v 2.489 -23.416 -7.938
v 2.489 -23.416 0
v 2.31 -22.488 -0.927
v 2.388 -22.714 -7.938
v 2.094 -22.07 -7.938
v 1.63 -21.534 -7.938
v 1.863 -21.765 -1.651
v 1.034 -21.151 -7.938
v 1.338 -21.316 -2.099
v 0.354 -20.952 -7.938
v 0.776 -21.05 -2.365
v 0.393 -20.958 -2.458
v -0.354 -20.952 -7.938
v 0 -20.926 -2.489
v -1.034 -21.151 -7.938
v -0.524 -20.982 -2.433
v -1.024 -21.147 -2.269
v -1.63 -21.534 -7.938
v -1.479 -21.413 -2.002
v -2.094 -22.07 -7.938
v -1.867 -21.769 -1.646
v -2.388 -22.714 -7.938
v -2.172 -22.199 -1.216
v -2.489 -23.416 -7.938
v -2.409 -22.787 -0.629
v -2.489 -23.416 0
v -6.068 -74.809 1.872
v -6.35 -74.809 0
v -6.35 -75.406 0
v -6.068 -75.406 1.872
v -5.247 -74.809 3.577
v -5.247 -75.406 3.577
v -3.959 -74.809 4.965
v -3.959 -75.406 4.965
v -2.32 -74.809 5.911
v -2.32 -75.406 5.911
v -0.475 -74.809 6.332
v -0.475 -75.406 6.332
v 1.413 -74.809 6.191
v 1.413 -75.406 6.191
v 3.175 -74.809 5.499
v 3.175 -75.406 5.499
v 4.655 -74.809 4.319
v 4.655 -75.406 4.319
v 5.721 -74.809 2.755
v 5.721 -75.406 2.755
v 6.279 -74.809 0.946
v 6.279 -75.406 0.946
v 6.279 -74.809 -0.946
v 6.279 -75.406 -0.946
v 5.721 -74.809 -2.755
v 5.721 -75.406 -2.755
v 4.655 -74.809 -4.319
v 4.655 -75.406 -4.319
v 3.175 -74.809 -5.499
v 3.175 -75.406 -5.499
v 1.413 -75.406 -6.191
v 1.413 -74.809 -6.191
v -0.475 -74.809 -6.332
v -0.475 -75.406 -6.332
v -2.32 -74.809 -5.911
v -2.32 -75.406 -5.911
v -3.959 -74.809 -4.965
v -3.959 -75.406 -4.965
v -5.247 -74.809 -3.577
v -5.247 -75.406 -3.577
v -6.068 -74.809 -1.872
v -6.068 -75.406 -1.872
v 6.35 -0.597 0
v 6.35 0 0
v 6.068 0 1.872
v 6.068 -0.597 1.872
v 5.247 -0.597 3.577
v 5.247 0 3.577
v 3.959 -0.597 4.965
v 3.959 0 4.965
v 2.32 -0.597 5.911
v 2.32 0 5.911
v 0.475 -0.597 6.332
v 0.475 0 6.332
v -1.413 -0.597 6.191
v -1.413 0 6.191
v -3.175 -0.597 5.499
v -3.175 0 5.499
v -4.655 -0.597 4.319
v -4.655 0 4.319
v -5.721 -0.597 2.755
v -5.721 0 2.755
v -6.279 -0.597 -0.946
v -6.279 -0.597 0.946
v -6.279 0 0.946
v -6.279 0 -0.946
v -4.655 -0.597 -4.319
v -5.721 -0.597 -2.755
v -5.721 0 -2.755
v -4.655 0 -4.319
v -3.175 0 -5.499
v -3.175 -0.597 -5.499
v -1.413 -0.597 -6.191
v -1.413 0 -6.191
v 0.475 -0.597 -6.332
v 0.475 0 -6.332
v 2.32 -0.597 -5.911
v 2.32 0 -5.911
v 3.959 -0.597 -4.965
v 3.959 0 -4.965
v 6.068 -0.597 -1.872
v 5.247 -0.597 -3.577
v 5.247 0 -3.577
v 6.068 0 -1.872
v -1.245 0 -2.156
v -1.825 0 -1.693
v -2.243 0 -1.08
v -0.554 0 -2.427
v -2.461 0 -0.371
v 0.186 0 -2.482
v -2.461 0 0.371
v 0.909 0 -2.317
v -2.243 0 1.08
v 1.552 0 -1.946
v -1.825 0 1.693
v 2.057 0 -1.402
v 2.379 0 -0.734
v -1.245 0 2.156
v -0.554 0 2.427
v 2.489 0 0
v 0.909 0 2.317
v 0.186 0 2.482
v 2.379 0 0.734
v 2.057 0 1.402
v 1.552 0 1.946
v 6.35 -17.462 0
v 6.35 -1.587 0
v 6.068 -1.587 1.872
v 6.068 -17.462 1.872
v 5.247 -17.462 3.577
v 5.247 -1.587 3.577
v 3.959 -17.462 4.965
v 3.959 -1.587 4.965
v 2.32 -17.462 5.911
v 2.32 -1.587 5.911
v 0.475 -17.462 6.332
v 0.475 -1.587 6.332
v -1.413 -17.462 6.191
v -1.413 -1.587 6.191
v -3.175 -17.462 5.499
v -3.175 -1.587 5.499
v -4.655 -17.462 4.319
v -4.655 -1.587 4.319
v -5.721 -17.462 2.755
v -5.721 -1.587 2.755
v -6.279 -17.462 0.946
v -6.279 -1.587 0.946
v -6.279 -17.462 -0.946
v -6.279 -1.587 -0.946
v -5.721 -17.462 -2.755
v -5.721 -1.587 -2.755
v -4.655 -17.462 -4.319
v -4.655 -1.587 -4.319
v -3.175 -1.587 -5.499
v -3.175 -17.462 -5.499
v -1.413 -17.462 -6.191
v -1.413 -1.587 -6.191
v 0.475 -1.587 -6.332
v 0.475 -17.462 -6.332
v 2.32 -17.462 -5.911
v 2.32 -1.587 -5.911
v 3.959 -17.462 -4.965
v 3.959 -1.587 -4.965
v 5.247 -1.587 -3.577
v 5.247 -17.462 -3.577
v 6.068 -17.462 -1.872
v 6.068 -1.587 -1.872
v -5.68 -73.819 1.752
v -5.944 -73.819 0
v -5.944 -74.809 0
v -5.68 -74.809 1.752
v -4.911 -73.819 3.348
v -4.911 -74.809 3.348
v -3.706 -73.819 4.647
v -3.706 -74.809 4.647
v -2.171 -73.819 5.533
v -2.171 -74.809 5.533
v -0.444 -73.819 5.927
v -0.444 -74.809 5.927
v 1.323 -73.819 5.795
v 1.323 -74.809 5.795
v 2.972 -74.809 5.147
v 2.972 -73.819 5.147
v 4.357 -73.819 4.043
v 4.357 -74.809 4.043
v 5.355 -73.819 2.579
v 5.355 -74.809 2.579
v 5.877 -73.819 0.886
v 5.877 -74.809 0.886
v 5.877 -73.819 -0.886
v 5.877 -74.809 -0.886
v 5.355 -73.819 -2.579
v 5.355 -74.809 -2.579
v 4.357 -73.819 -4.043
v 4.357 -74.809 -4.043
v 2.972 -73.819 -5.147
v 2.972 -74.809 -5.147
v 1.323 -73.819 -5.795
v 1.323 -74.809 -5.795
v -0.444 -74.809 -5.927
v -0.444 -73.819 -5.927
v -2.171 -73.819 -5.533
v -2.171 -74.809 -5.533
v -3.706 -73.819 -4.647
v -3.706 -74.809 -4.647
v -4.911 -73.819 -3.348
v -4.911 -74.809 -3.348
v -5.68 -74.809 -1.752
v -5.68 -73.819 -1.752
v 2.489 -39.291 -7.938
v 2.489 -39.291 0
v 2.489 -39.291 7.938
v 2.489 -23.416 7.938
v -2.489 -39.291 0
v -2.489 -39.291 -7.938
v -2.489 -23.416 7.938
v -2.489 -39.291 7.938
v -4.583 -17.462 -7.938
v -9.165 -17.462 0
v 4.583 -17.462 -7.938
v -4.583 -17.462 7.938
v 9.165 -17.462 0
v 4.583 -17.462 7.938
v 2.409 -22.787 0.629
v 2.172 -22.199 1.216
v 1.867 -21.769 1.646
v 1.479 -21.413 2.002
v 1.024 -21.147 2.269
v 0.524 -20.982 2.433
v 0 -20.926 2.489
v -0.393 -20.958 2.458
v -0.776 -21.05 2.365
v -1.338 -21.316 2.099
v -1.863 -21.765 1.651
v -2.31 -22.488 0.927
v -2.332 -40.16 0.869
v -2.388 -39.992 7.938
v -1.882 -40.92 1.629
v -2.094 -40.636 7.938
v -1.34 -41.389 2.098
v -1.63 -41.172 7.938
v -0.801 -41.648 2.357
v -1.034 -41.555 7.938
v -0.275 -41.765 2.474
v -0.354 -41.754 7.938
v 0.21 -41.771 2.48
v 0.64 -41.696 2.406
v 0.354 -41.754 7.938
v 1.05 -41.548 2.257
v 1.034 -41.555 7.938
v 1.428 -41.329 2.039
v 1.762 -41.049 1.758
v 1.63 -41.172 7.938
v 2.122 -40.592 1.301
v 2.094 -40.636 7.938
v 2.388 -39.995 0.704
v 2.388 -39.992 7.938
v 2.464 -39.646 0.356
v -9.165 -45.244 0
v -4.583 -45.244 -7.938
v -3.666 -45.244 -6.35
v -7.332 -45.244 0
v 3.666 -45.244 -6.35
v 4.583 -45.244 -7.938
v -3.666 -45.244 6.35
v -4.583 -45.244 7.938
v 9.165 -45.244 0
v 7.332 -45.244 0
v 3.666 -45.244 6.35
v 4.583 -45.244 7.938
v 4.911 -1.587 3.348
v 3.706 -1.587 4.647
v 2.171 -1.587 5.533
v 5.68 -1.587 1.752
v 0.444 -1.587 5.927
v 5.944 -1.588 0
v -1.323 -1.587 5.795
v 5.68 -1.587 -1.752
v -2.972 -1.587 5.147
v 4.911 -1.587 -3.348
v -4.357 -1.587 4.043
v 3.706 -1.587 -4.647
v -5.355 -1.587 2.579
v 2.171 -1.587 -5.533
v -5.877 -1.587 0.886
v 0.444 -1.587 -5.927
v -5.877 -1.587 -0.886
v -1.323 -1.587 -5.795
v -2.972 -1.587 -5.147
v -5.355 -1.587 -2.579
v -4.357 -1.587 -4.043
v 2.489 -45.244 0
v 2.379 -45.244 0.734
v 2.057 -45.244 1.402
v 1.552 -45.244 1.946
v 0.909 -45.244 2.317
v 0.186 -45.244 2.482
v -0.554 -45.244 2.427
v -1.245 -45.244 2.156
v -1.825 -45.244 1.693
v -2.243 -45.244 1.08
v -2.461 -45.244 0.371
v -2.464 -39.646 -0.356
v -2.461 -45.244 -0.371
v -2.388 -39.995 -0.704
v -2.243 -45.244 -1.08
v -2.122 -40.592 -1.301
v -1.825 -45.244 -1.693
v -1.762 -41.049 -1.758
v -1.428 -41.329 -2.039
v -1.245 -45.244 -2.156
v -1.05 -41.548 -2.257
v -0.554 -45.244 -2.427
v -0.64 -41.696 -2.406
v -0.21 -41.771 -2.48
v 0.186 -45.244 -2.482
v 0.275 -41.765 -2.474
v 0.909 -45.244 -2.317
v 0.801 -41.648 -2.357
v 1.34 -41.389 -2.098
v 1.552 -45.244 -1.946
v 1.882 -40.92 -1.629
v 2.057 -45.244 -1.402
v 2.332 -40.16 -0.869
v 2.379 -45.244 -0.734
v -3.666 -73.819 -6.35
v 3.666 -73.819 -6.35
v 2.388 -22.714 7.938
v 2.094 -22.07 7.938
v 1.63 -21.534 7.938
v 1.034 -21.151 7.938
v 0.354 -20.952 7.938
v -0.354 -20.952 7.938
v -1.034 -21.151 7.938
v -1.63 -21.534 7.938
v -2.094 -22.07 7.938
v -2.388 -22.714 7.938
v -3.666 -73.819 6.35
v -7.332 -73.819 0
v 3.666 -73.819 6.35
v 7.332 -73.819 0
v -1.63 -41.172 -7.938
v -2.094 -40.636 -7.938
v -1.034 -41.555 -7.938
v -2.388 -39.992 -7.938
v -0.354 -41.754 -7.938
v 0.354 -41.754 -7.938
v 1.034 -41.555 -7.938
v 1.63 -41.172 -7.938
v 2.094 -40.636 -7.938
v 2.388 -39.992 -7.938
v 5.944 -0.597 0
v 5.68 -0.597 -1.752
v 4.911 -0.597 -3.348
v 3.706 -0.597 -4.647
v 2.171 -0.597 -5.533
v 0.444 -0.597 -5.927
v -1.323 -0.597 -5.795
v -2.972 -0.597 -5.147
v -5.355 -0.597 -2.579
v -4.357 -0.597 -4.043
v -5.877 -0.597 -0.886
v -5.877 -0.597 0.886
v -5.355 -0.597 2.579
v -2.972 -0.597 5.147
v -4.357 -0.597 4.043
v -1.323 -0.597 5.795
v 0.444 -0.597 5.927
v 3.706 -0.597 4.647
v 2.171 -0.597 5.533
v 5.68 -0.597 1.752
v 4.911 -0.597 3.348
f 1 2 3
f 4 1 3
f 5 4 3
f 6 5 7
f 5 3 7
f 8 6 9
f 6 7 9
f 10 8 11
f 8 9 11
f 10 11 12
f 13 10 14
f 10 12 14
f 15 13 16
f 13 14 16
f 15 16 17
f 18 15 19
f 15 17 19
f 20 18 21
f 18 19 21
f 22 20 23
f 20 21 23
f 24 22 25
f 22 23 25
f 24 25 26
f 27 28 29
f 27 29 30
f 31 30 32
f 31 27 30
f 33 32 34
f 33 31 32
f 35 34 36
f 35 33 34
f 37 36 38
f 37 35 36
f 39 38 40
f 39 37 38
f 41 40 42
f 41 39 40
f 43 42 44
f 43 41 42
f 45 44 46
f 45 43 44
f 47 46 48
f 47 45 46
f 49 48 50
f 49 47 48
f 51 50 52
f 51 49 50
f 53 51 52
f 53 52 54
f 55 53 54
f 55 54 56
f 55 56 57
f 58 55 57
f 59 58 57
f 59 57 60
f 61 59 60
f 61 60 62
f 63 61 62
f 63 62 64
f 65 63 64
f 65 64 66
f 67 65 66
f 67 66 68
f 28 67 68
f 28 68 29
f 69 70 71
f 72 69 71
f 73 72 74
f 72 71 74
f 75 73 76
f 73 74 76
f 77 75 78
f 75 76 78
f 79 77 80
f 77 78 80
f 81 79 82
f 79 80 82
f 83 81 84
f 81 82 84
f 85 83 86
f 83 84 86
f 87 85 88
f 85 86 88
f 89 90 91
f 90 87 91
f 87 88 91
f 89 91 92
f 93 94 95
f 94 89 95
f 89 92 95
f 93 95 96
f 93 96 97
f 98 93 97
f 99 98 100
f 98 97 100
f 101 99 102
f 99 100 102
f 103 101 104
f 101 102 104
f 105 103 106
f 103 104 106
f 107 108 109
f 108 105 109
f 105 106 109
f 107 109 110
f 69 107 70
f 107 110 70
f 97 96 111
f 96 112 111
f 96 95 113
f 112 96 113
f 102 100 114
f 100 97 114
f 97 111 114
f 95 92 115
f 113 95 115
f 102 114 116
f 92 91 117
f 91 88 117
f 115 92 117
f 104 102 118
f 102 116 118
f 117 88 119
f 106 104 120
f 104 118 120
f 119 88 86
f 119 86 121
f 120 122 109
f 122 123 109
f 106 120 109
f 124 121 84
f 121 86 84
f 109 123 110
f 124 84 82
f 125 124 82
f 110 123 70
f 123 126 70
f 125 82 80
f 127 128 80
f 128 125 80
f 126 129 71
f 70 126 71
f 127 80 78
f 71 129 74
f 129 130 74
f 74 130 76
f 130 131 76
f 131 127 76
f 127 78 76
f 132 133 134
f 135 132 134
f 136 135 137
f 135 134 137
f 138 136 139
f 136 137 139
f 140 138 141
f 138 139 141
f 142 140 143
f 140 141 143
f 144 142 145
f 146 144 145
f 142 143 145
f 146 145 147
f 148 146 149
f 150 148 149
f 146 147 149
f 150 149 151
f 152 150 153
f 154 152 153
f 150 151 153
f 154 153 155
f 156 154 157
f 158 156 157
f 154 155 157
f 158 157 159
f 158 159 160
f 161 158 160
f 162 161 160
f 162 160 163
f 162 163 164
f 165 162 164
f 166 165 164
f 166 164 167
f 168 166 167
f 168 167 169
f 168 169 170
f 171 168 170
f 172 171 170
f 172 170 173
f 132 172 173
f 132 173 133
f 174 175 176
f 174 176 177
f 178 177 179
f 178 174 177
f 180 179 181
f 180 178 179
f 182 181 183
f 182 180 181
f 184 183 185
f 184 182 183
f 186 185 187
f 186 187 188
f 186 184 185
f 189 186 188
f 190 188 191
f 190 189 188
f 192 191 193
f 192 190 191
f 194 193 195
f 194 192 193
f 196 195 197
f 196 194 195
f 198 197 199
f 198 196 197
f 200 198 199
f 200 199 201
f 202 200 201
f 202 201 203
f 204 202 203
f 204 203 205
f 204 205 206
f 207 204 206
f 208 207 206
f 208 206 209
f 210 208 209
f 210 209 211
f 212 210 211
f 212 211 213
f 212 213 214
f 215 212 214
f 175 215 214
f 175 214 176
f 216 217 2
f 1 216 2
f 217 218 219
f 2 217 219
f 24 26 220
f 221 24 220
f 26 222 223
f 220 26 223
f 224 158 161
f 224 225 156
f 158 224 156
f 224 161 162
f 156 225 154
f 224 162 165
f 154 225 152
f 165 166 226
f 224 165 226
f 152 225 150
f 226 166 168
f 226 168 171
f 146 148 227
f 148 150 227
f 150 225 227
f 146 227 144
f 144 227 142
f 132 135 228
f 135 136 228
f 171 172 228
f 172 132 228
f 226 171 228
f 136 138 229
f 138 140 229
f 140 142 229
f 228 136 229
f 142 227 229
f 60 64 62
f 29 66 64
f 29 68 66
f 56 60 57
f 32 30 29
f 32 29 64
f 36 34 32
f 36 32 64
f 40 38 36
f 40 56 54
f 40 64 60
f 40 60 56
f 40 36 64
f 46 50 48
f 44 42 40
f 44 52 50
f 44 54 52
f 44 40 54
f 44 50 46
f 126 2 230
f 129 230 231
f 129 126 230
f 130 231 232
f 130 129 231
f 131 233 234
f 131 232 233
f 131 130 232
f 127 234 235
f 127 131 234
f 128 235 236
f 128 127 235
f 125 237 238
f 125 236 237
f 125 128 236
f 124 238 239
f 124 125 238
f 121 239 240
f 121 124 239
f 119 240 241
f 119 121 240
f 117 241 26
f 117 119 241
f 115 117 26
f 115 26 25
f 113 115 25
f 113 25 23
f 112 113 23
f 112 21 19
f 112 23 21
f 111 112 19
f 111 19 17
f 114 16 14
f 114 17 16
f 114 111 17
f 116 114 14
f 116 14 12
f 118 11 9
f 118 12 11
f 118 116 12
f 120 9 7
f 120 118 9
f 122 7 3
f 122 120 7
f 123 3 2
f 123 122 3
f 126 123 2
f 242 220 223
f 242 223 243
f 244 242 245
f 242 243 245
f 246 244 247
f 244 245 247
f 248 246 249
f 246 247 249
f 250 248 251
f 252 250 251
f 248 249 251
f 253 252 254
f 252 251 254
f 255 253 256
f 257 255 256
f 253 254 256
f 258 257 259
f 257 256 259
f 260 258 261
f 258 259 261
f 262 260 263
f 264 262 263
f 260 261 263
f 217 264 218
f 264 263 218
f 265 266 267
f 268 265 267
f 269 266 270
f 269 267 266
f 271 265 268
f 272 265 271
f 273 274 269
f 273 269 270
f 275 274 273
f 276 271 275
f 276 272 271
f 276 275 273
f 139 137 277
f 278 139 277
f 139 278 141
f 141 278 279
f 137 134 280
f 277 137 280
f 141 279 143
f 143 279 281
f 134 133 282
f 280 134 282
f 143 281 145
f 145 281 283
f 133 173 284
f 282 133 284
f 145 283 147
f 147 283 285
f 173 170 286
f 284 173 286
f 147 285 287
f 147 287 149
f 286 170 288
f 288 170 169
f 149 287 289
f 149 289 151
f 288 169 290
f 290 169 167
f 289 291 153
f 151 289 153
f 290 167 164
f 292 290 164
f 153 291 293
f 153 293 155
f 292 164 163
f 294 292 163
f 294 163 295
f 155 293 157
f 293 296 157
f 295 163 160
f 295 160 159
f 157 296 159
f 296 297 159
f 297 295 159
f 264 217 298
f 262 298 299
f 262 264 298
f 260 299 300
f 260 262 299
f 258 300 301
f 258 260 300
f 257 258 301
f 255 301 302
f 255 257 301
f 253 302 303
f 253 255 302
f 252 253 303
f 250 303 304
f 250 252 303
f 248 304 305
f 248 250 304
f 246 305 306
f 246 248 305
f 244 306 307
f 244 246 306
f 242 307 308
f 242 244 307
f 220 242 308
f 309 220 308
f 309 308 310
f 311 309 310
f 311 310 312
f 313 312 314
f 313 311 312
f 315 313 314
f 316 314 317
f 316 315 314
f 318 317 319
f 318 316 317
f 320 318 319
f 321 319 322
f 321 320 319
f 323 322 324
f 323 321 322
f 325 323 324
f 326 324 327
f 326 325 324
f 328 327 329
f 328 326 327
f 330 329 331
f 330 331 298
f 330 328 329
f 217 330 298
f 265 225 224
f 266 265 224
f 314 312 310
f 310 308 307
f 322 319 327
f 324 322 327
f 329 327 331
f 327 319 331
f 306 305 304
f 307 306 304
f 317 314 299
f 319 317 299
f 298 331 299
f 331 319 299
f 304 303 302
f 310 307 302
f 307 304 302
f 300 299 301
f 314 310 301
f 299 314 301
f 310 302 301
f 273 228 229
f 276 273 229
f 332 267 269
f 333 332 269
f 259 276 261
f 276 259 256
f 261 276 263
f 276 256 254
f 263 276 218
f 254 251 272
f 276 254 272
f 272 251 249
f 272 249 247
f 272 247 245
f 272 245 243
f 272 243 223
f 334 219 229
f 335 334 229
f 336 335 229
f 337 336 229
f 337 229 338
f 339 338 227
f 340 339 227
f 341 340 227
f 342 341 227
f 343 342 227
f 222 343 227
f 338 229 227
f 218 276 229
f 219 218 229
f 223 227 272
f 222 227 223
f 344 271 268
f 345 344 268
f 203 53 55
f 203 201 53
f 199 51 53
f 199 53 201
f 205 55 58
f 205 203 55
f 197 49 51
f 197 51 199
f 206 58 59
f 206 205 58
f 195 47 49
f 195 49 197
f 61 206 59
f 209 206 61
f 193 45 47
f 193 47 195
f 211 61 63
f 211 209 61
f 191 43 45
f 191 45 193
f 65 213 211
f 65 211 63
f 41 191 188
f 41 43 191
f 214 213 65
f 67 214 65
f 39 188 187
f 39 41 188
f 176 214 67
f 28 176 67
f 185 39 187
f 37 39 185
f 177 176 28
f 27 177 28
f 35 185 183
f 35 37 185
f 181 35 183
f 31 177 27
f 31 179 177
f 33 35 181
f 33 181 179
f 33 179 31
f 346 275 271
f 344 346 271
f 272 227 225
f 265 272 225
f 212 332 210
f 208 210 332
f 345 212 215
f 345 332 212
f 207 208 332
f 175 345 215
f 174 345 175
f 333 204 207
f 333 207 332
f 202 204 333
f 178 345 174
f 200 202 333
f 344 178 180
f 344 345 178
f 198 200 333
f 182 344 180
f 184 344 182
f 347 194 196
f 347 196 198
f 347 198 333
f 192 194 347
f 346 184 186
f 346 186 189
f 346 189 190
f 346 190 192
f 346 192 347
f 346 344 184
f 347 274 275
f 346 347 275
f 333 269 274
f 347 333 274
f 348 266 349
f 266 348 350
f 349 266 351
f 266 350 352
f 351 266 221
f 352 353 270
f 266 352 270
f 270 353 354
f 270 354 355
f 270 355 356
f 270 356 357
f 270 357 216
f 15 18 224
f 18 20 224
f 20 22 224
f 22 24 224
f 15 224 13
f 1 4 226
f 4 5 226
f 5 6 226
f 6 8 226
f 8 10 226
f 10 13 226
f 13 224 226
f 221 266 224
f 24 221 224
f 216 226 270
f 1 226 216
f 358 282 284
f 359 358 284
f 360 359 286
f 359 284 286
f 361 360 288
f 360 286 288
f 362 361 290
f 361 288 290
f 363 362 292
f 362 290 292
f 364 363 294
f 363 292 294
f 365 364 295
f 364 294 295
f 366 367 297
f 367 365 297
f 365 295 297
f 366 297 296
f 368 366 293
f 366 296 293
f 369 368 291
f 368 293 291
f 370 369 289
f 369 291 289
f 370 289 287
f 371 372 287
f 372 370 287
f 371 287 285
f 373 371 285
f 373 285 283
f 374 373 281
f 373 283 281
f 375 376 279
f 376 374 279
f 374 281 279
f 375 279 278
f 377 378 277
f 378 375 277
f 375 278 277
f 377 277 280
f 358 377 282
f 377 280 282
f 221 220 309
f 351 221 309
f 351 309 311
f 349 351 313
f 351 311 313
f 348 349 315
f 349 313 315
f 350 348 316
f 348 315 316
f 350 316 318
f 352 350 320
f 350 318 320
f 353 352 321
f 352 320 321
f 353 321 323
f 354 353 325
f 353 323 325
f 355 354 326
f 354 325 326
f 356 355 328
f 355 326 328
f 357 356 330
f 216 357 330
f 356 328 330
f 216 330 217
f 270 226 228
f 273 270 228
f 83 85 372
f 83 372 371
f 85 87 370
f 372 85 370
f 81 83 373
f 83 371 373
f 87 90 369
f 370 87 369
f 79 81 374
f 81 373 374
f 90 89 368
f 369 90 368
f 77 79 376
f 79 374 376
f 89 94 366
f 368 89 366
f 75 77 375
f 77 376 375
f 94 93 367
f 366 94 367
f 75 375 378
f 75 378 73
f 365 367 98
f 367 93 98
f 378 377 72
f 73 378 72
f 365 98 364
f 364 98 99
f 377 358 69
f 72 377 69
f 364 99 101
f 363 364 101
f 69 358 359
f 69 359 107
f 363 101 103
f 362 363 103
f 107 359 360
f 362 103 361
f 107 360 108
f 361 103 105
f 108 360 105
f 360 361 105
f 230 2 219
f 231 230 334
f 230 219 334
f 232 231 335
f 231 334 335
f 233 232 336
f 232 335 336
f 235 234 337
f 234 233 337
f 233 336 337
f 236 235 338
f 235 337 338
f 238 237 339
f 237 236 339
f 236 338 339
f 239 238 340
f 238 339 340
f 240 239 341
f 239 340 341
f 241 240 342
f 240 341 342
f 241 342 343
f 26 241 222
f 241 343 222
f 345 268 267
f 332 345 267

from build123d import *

# Parameters (mm, degrees)
F0_R     = 6.35
F0_R_2   = 2.4892
F1_DEPTH = 17.4625
F2_R     = 2.4892
F3_DEPTH = 27.78125
F5_DEPTH = 15.876
F7_DEPTH = 30.1625


with BuildPart() as f1:
    # F0 (on Front) → F1 (new body)
    with BuildSketch(Plane.XZ):
        Circle(F0_R)
        Circle(F0_R_2, mode=Mode.SUBTRACT)
    extrude(amount=F1_DEPTH)

    # F2 (on face) → F3 (join)
    with BuildSketch(Plane.XZ.offset(17.4625)):
        Polygon((4.5827177617, 7.9375), (-4.5827177617, 7.9375), (-9.1654355234, 0), (-4.5827177617, -7.9375), (4.5827177617, -7.9375), (9.1654355234, 0), align=None)
        Circle(F2_R, mode=Mode.SUBTRACT)
    extrude(amount=F3_DEPTH)

    # F4 (on face) → F5 (cut, through all)
    with BuildSketch(Plane.XY.offset(7.9375)):
        with BuildLine():
            ThreePointArc((2.4892, -23.415625), (0, -20.926425), (-2.4892, -23.415625))
            Line((-2.4892, -23.415625), (-2.4892, -39.290625))
            ThreePointArc((-2.4892, -39.290625), (0, -41.779825), (2.4892, -39.290625))
            Line((2.4892, -39.290625), (2.4892, -23.415625))
        make_face()
    extrude(amount=-F5_DEPTH, mode=Mode.SUBTRACT)

    # F6 (on face) → F7 (join)
    with BuildSketch(Plane.XZ.offset(45.24375)):
        Polygon((-3.6661742094, -6.35), (3.6661742094, -6.35), (7.3323484187, 0), (3.6661742094, 6.35), (-3.6661742094, 6.35), (-7.3323484187, 0), align=None)
    extrude(amount=F7_DEPTH)

    # F8 (on Top) → F9 (revolve, cut)
    with BuildSketch(Plane.XY):
        Polygon((-7.3323484187, -75.40625), (-6.35, -75.40625), (-6.35, -74.80935), (-5.9436, -74.80935), (-5.9436, -73.81875), (-7.3323484187, -73.81875), align=None)
        Polygon((6.35, -74.80935), (6.35, -75.40625), (7.3323484187, -75.40625), (7.3323484187, -73.81875), (5.9436, -73.81875), (5.9436, -74.80935), align=None)
        Polygon((7.3323484187, -1.5875), (7.3323484187, 0), (6.35, 0), (6.35, -0.5969), (5.9436, -0.5969), (5.9436, -1.5875), align=None)
        Polygon((-5.9436, -0.5969), (-6.35, -0.5969), (-6.35, 0), (-7.3323484187, 0), (-7.3323484187, -1.5875), (-5.9436, -1.5875), align=None)
    revolve(axis=Axis((0, -37.703125, 0), (0, 1, 0)), mode=Mode.SUBTRACT)


solid = f1.part
